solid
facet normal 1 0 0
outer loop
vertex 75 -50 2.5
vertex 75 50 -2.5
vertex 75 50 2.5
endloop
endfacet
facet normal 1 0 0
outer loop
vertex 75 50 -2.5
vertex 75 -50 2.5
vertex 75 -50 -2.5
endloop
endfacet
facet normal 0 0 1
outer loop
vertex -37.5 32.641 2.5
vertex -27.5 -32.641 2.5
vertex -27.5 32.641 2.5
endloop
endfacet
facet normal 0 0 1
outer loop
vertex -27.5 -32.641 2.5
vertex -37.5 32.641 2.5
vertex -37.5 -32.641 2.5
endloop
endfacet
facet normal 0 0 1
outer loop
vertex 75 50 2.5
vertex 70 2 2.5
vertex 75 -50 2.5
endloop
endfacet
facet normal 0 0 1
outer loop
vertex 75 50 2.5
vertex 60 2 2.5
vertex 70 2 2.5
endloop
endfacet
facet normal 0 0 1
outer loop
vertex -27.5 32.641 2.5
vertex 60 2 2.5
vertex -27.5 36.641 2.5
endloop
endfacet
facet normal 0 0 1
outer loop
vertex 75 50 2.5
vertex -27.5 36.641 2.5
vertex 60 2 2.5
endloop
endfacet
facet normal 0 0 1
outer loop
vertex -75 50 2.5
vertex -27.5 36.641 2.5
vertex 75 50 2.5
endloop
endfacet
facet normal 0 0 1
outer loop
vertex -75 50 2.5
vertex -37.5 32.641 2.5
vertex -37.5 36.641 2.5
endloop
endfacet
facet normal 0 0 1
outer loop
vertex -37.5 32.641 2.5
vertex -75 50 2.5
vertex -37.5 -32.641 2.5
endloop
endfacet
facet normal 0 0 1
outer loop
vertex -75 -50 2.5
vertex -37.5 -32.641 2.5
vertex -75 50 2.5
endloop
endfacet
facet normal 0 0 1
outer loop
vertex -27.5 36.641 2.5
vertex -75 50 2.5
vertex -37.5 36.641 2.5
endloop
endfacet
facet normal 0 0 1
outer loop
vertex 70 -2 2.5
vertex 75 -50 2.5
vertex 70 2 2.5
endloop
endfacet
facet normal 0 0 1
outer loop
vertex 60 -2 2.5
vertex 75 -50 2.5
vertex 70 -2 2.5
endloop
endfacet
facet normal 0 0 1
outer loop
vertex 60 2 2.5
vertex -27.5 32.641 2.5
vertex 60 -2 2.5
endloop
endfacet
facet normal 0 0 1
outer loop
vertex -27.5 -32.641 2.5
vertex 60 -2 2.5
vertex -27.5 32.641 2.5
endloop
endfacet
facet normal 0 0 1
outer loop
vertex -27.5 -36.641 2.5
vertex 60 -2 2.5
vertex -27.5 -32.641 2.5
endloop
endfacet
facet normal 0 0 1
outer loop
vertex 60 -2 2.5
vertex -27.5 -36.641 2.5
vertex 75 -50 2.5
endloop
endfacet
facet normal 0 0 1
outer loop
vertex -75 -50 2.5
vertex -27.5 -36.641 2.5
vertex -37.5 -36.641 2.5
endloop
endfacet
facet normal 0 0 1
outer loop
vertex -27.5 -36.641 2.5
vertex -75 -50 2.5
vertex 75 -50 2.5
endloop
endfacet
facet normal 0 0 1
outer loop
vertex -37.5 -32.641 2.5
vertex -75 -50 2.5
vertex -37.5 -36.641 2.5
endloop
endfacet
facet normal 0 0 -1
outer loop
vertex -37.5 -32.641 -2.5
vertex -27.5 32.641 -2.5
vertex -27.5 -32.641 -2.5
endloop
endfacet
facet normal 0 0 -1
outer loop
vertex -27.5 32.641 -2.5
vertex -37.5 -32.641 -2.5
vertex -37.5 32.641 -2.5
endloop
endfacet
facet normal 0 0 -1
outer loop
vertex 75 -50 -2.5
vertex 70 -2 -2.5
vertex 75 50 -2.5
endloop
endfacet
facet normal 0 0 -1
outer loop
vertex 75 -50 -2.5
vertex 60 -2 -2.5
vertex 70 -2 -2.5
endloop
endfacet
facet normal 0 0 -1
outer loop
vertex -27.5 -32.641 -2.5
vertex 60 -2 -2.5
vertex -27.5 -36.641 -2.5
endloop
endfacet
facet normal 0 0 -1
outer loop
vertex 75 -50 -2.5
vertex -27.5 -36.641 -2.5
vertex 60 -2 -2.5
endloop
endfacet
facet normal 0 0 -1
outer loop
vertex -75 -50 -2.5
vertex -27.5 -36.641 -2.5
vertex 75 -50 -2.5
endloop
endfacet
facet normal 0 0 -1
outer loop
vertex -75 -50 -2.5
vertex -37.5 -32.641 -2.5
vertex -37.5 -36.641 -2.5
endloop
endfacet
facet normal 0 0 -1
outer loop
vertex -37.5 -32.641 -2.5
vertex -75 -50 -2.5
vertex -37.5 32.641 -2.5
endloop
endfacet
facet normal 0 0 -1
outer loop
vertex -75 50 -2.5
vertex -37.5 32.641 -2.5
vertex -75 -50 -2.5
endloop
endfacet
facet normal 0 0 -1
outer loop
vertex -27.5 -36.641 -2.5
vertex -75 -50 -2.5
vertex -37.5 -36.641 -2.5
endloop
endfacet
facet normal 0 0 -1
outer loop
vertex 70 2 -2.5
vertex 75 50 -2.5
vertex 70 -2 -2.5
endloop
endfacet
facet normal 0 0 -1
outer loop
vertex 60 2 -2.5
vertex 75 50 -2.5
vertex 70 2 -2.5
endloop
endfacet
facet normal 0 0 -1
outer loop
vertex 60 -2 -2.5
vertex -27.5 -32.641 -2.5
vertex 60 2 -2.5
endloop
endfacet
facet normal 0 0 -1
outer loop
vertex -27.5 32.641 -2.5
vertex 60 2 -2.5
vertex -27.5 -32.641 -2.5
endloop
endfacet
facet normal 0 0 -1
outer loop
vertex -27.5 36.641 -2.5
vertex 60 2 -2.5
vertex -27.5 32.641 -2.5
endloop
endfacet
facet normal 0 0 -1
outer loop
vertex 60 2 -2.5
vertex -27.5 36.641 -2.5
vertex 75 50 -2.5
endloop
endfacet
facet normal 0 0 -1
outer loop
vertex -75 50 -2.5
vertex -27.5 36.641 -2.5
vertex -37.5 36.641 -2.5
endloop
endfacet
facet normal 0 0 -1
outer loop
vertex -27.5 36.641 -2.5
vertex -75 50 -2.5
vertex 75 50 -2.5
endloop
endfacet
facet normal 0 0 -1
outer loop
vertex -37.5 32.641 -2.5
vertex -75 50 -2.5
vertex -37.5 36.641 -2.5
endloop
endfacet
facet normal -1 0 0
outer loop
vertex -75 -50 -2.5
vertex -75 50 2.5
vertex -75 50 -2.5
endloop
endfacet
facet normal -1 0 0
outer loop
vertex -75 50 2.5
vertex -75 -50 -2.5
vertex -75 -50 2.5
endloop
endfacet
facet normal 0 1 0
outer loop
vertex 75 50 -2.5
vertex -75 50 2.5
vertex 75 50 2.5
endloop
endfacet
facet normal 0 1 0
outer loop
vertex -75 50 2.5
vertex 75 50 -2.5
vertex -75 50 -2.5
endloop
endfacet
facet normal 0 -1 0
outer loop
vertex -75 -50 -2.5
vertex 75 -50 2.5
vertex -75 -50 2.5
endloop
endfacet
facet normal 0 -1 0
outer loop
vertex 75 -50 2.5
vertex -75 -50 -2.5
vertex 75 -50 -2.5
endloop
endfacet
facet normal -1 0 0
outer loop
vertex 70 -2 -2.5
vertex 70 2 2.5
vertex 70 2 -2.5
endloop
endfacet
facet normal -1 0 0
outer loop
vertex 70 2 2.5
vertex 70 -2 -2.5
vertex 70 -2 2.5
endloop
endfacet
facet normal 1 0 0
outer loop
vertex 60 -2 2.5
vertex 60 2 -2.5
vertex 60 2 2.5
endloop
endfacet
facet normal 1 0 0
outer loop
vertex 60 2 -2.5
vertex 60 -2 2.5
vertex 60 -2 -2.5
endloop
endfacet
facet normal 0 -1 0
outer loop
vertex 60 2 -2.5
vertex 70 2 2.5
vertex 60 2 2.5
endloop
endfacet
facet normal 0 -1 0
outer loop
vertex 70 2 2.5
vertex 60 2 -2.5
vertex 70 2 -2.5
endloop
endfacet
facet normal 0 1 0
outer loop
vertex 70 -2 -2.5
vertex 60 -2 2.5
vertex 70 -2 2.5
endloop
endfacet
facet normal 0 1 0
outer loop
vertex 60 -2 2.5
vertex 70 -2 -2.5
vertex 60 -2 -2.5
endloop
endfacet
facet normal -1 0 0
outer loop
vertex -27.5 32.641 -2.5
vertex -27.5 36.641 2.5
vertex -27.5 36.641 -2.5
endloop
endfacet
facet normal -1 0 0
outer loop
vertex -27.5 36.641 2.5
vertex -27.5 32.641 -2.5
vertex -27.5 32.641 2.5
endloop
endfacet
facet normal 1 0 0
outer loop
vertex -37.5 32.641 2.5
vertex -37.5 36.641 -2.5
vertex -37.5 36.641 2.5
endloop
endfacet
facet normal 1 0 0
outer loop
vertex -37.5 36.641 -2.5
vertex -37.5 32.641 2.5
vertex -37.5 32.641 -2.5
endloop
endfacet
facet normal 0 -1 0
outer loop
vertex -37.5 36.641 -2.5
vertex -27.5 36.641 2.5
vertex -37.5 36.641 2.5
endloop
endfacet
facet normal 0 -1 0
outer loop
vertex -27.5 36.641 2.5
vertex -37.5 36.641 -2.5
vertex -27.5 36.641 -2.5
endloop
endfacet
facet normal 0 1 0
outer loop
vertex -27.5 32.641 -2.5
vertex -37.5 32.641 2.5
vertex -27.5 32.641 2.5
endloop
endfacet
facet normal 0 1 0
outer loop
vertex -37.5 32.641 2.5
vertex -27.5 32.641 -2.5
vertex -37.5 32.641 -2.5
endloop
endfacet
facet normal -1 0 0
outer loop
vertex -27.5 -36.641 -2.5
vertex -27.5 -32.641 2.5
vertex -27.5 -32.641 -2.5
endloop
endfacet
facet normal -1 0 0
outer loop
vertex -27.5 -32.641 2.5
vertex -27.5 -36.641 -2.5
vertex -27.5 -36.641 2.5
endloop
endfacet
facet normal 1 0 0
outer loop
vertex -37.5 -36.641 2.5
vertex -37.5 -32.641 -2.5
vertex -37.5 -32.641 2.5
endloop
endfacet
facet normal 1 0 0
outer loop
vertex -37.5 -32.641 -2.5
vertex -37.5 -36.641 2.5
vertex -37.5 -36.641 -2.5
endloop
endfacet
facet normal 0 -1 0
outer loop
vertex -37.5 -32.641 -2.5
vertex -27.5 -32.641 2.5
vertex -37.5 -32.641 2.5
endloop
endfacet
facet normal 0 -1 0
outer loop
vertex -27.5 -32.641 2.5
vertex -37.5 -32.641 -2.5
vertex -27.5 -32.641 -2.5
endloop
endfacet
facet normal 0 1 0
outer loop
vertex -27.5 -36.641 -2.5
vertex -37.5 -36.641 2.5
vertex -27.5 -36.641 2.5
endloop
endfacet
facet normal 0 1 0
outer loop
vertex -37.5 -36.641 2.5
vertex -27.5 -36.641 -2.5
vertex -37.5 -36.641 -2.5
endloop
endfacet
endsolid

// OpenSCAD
// ========================================
// a 15 x 10 x 0.5 cm plate with three 1 x 0.4 cm slots
// NeuroCAD canonical IR; dimensions are millimetres
// ========================================
$fn = 48;

difference() {
  cube(size=[150, 100, 5], center=true);
  translate([65, 0, 0]) {
    cube(size=[10, 4, 7], center=true);
  }
  translate([-32.5, 34.6410161513775, 0]) {
    cube(size=[10, 4, 7], center=true);
  }
  translate([-32.5, -34.6410161513775, 0]) {
    cube(size=[10, 4, 7], center=true);
  }
}
